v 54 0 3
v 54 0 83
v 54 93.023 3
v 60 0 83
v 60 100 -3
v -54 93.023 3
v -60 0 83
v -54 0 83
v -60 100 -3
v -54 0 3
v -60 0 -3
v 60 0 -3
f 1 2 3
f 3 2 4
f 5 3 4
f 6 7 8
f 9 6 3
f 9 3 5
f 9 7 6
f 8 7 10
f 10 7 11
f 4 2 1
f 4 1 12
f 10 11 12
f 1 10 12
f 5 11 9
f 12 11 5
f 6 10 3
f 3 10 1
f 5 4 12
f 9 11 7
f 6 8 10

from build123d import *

# Parameters (mm, degrees)
SKETCH1_W           = 6
SKETCH1_H           = 80
SKETCH1_W_2         = 120
SKETCH1_H_2         = 6
BOSS_EXTRUDE1_DEPTH = 100
CUT_EXTRUDE1_DEPTH  = 120


with BuildPart() as part:
    # Sketch1 → Boss-Extrude1 (new body)
    with BuildSketch(Plane(origin=(0, 0, 0), x_dir=(1, 0, 0), z_dir=(0, 1, 0))):
        with Locations((57, -43)):
            Rectangle(SKETCH1_W, SKETCH1_H)
        Rectangle(SKETCH1_W_2, SKETCH1_H_2)
        with Locations((-57, -43)):
            Rectangle(SKETCH1_W, SKETCH1_H)
    extrude(amount=BOSS_EXTRUDE1_DEPTH)

    # Sketch2 → Cut-Extrude1 (cut)
    with BuildSketch(Plane.ZY.offset(60)):
        Polygon((83, 0), (-3, 100), (83, 100), align=None)
    extrude(amount=-CUT_EXTRUDE1_DEPTH, mode=Mode.SUBTRACT)


solid = part.part
